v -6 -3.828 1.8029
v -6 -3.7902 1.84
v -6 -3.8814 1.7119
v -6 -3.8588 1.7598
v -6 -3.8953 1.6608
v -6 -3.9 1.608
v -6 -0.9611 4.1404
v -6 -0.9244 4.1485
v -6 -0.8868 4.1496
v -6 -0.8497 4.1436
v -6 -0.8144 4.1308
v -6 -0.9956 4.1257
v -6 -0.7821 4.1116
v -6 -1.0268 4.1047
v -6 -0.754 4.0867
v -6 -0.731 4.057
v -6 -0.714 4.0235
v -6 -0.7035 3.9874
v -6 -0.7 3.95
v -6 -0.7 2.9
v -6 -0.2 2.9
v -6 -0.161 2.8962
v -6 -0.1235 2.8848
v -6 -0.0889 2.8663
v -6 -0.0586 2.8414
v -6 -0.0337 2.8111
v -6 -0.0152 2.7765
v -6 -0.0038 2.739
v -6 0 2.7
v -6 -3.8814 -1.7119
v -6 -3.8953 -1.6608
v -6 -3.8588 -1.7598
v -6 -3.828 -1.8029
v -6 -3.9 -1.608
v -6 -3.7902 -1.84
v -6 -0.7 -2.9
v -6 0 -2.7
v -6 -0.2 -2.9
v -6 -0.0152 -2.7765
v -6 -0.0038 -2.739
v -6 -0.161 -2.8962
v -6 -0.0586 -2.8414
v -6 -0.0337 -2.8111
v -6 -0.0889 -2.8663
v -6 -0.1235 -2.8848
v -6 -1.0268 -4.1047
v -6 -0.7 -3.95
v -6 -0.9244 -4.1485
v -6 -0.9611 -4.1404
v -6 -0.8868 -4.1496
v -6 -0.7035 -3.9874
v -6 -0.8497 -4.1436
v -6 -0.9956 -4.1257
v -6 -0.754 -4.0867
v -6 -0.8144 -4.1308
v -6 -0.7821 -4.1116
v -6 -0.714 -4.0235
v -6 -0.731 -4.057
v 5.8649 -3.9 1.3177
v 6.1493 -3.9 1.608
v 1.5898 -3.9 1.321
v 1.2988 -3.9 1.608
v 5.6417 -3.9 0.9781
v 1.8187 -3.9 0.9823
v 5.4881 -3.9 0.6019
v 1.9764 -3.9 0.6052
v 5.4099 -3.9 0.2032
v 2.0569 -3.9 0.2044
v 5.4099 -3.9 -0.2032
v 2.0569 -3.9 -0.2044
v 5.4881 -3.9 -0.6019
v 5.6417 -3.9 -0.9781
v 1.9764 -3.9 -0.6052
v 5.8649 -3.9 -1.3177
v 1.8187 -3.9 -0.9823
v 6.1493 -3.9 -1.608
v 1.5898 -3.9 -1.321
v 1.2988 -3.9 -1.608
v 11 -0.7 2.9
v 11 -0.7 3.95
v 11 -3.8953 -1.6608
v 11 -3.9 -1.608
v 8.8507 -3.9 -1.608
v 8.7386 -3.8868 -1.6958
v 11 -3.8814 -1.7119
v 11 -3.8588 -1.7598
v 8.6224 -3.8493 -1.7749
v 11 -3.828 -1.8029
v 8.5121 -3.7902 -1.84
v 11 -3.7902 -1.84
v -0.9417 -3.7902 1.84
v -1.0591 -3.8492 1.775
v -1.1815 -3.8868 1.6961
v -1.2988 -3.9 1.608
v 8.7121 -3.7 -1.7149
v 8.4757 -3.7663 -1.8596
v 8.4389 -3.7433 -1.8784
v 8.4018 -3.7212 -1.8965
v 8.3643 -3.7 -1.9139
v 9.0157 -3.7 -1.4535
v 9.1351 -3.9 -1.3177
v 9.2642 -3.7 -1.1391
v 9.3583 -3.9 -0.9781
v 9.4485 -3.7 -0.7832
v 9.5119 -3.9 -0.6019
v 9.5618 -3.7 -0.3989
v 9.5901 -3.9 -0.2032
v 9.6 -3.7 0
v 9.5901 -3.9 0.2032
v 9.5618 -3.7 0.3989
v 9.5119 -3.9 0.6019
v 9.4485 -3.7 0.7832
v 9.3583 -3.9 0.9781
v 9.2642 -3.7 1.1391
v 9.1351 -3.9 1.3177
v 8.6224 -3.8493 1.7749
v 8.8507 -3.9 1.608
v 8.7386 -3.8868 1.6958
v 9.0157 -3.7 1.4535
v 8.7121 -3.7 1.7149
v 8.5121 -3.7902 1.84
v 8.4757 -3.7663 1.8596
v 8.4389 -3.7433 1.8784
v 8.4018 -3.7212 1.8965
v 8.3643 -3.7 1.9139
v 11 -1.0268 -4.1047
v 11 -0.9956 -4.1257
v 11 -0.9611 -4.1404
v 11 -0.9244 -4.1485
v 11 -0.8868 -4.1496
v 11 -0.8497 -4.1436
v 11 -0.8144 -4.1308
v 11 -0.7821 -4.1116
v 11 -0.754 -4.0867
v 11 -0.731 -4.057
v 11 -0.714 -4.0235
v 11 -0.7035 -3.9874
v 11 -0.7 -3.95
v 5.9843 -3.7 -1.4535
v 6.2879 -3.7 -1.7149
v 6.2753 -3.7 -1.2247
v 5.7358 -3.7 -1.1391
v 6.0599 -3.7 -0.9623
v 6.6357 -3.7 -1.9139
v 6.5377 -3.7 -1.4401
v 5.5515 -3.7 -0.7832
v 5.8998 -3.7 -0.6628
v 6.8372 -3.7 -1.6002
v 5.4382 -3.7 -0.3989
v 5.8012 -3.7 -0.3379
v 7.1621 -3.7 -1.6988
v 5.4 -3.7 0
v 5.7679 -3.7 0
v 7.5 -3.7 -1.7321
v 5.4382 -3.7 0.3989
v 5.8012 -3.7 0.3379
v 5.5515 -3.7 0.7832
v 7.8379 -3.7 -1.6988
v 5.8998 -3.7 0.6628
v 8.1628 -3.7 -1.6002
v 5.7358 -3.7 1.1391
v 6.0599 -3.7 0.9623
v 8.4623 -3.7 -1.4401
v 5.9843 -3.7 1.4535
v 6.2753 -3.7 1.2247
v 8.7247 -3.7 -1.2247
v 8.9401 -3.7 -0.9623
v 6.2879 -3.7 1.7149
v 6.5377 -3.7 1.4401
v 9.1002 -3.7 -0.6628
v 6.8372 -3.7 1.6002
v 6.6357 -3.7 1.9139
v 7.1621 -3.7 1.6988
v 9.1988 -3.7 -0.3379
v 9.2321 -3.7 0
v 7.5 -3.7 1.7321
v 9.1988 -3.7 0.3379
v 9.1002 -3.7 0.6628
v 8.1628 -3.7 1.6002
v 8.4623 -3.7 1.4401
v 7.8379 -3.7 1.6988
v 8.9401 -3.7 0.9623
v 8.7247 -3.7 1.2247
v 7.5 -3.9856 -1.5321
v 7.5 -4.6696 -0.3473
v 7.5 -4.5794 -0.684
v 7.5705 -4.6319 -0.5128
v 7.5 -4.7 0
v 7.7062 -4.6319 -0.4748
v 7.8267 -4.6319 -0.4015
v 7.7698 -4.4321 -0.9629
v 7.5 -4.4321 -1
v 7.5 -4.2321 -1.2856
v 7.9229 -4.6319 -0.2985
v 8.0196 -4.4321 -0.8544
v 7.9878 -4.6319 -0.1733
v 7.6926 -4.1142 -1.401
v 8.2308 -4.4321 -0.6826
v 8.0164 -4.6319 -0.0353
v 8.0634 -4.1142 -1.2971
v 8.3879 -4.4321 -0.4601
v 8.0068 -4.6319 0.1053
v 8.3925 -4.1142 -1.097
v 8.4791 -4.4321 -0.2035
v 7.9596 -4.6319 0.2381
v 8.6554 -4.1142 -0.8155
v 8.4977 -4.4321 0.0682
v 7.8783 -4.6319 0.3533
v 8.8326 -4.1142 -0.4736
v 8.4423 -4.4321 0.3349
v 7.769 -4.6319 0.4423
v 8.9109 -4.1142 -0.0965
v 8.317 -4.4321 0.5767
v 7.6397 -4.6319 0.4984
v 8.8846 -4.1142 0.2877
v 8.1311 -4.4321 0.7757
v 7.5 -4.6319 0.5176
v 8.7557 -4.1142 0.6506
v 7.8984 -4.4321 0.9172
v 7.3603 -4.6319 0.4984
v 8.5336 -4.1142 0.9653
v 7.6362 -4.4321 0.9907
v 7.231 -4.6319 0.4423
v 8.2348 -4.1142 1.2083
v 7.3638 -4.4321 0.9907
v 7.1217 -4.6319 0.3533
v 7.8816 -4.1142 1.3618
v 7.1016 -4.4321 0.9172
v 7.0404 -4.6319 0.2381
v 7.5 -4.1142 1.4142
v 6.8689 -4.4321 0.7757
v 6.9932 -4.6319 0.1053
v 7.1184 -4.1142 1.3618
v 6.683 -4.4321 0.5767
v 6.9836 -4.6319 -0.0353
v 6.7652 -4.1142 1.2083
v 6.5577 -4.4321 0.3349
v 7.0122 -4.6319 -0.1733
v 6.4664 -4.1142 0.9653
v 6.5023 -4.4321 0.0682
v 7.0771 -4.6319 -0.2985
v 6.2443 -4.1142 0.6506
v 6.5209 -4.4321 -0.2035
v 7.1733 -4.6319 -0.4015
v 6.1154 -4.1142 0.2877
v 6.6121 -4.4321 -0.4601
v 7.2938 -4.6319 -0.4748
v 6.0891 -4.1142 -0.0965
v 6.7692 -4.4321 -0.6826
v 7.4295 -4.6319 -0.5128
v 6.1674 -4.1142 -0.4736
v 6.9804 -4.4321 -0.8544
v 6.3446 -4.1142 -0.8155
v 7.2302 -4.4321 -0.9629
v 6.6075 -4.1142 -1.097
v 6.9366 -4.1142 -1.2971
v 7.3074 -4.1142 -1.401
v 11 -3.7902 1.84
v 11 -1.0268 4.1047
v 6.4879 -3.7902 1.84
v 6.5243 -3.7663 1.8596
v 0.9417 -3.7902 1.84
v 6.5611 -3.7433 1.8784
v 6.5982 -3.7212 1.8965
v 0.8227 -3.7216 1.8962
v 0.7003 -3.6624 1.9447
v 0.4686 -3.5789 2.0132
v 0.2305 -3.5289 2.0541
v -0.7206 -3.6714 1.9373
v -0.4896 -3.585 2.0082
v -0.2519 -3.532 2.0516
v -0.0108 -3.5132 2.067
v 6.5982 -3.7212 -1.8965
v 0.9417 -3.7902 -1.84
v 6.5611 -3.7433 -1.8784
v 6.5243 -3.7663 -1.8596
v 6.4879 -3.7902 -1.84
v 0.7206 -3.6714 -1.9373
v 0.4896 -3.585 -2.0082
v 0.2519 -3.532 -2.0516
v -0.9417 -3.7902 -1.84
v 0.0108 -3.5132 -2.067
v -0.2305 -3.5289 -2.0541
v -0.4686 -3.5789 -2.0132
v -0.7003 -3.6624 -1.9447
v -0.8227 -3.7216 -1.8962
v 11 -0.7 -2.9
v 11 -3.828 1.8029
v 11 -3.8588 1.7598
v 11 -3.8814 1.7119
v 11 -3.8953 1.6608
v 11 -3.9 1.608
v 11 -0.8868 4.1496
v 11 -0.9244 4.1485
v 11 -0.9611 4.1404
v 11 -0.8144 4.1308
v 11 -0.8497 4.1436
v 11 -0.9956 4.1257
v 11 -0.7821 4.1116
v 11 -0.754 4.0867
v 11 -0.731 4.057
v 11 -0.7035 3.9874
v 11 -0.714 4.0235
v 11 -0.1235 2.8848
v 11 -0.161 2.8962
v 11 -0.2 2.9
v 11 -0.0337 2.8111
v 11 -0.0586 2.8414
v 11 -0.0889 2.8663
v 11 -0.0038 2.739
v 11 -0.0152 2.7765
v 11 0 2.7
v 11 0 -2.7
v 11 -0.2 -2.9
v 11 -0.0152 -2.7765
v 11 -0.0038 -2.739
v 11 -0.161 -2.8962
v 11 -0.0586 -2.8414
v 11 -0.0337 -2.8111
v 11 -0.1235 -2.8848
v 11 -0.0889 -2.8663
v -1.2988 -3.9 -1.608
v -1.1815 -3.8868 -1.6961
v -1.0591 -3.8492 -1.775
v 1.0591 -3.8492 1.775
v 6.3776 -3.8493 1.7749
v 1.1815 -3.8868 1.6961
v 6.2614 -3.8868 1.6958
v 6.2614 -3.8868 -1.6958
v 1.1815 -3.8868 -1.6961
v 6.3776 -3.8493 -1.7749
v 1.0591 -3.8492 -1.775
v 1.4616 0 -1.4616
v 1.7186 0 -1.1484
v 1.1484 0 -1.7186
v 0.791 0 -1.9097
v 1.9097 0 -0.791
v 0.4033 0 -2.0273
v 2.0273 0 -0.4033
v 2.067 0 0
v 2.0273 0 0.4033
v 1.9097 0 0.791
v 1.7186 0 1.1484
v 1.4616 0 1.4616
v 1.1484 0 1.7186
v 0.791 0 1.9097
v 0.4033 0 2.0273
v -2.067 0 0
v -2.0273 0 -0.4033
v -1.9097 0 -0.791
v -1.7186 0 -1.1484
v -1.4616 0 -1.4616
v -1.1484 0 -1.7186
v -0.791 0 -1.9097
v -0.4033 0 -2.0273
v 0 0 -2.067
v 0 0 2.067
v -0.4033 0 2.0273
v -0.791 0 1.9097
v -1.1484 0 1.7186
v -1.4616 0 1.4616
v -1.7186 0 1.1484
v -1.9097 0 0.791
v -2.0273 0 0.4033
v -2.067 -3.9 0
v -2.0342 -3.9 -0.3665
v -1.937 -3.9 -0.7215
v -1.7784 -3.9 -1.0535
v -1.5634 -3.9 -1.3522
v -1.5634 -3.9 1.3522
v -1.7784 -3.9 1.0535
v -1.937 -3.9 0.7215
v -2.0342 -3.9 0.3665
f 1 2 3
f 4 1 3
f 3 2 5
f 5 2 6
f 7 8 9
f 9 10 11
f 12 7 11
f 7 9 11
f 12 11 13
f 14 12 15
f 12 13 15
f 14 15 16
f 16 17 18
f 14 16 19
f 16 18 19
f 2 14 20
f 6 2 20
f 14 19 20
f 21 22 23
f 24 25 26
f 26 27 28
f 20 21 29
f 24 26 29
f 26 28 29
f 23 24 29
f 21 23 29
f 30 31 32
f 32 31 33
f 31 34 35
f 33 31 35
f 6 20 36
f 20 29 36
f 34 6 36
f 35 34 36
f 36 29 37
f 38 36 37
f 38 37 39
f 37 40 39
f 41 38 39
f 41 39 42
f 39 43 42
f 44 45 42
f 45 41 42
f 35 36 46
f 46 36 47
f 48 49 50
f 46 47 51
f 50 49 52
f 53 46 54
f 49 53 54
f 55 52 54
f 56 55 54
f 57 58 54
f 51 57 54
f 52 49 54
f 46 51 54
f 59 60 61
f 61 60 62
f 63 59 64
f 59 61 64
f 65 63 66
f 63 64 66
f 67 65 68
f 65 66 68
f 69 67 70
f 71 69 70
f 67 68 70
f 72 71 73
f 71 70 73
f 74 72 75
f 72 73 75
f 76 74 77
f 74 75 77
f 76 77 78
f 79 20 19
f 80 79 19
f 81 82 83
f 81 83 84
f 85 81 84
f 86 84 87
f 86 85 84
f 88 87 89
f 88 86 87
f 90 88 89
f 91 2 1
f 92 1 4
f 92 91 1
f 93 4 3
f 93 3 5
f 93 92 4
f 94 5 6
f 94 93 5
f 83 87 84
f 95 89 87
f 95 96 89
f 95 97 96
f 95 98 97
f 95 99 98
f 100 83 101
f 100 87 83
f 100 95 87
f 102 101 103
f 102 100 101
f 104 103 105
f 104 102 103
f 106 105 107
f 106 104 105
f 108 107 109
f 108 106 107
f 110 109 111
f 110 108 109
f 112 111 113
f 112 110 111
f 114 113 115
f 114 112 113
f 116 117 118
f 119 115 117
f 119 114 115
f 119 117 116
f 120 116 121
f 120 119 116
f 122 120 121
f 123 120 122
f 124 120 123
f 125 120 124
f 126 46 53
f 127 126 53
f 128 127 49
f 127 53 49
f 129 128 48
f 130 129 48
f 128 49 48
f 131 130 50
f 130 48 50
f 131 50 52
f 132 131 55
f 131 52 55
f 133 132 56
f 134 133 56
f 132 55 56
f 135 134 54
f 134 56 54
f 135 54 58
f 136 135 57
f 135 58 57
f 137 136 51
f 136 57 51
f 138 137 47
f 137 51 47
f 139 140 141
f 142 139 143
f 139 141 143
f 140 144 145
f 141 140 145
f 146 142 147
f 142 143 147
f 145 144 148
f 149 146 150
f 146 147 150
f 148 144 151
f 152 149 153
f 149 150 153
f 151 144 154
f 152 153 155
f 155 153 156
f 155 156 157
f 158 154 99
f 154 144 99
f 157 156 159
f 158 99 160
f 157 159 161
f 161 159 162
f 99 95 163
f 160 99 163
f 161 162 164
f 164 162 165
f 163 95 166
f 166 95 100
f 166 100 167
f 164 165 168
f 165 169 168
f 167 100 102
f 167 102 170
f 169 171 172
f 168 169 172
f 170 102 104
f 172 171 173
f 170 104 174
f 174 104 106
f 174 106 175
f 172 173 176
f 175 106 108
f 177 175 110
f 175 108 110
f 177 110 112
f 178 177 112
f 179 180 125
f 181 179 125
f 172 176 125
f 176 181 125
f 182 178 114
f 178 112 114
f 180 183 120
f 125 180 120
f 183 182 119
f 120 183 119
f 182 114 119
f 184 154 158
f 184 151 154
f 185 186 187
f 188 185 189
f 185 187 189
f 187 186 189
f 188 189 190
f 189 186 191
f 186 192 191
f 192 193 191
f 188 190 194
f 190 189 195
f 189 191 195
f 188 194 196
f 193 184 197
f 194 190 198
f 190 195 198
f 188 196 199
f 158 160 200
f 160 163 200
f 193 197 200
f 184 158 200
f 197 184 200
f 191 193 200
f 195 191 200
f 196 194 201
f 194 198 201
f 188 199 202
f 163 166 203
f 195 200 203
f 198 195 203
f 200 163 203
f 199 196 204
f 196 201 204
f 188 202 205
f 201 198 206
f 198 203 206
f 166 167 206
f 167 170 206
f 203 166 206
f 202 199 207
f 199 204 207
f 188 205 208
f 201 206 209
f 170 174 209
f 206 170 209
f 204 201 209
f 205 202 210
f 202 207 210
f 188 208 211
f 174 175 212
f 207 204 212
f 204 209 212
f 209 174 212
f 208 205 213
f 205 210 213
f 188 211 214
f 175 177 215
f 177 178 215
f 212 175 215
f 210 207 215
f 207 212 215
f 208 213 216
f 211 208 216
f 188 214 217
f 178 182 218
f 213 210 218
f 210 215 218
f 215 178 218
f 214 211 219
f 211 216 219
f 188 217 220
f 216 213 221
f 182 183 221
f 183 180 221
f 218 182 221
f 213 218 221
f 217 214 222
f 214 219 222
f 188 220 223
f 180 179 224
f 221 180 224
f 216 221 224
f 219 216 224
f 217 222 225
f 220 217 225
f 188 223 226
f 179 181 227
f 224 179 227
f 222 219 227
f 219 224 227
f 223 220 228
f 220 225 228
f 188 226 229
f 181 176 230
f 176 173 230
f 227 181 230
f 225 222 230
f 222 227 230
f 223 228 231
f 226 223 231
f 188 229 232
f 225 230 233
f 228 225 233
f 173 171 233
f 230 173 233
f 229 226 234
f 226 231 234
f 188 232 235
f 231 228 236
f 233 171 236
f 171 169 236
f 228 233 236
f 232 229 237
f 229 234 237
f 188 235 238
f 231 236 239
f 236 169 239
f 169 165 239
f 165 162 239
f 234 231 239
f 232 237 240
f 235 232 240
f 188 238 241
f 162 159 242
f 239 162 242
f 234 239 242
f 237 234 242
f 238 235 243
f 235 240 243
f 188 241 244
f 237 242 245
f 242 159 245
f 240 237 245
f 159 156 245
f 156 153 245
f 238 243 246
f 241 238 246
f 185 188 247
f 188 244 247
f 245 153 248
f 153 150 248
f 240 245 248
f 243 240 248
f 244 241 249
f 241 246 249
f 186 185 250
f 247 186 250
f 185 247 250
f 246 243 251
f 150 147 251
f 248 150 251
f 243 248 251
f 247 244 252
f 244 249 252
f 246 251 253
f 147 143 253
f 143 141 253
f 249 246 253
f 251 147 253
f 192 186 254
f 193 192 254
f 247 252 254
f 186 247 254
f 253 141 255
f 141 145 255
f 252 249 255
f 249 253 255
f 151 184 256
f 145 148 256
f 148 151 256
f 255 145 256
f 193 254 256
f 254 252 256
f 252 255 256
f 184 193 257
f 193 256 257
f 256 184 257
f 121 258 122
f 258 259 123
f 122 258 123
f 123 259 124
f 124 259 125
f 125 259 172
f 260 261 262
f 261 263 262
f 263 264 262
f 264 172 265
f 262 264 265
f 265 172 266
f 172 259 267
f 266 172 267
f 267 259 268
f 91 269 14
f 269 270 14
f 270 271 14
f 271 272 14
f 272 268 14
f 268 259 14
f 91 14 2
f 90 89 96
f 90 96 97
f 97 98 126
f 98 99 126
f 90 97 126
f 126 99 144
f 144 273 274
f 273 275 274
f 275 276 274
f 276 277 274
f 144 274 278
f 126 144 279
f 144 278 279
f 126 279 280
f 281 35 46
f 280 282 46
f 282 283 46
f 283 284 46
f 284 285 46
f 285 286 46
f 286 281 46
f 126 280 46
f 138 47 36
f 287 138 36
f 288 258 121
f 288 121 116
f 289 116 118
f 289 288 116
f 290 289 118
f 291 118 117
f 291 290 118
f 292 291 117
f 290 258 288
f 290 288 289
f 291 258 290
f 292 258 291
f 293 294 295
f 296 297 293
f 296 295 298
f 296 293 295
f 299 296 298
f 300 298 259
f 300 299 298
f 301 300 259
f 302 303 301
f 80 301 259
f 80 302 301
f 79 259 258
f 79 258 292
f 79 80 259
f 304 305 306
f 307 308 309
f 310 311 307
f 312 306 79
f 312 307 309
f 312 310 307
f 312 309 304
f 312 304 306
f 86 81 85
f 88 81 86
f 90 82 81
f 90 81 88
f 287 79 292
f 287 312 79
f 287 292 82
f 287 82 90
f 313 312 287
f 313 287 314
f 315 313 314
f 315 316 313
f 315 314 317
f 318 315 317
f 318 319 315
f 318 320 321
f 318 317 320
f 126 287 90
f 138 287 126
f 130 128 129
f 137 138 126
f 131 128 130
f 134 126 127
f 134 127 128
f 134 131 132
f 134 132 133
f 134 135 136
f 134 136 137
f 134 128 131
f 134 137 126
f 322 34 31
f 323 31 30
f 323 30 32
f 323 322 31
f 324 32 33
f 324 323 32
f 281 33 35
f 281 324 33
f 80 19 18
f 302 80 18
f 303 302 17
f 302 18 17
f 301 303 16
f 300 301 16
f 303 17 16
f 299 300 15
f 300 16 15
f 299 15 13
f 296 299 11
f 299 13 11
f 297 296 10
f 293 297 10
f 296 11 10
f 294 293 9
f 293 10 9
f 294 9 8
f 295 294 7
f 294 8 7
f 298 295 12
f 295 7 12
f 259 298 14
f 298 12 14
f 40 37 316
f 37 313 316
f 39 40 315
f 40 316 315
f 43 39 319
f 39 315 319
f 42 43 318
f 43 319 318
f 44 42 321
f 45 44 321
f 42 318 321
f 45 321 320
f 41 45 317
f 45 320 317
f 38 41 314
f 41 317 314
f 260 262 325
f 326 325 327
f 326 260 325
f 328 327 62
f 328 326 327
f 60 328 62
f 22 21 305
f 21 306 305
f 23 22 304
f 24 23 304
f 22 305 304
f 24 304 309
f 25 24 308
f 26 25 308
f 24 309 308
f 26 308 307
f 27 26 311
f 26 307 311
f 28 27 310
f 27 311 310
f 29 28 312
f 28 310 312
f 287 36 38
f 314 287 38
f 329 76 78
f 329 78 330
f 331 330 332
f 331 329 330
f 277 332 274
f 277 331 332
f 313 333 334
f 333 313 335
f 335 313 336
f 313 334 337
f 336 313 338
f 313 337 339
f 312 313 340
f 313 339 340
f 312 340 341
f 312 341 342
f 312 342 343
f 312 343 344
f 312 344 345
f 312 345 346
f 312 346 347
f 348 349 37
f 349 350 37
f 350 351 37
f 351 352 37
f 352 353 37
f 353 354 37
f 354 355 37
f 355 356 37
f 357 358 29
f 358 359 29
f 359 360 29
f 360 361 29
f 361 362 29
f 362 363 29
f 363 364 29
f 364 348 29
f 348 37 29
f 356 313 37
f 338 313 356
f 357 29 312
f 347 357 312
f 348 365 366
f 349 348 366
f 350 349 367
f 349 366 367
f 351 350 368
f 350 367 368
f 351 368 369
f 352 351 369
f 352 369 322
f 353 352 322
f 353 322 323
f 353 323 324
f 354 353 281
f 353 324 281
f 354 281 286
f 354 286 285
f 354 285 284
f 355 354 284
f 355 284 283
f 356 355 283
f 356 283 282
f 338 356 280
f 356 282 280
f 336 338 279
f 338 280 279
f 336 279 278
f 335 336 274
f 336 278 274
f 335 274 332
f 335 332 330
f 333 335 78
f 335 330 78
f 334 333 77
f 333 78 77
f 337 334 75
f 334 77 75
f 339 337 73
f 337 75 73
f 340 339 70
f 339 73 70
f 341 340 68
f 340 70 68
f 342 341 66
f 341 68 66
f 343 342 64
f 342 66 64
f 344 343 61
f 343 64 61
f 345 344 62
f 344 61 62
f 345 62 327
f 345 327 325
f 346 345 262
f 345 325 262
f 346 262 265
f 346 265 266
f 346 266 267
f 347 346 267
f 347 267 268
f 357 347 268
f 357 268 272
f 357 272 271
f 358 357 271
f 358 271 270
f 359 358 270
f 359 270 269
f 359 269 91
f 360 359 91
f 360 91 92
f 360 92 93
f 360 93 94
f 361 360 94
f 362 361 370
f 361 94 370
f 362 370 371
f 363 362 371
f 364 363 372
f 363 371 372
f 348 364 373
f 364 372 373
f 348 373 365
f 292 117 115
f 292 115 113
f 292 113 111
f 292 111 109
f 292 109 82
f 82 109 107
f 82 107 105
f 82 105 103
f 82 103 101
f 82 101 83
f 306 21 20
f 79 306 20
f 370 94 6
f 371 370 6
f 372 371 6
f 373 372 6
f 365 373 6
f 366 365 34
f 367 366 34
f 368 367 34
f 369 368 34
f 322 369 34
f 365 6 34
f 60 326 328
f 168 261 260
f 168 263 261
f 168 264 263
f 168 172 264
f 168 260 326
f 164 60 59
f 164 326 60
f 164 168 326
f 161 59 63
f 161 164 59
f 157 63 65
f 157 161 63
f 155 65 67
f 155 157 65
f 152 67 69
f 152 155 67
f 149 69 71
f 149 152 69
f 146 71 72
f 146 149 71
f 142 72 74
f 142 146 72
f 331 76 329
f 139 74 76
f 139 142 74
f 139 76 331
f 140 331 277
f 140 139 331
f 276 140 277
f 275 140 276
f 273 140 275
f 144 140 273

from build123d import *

# Parameters (mm, degrees)
BOSS_EXTRUDE1_DEPTH = 17
FILLET1_R           = 0.3
FILLET2_R           = 0.2
SKETCH2_W           = 2.1
SKETCH2_H           = 0.2
TAPPED_HOLE1_D      = 4.134


with BuildPart() as part:
    # Sketch1 → Boss-Extrude1 (new body)
    with BuildSketch(Plane(origin=(-6, 0, 0), x_dir=(0, 0, -1), z_dir=(1, 0, 0))):
        with BuildLine():
            Line((2.9, 0), (-2.9, 0))
            Line((-2.9, 0), (-2.9, -0.7))
            Line((-2.9, -0.7), (-3.95, -0.7))
            ThreePointArc((-3.95, -0.7), (-4.13076842, -0.814426765), (-4.104689384, -1.026772215))
            Line((-4.104689384, -1.026772215), (-1.75, -3.9))
            Line((-1.75, -3.9), (1.75, -3.9))
            Line((1.75, -3.9), (4.104689384, -1.026772215))
            ThreePointArc((4.104689384, -1.026772215), (4.13076842, -0.814426765), (3.95, -0.7))
            Line((3.95, -0.7), (2.9, -0.7))
            Line((2.9, -0.7), (2.9, 0))
        make_face()
    extrude(amount=BOSS_EXTRUDE1_DEPTH)

    # Fillet1
    fillet1_edges = [part.edges().sort_by_distance(p)[0] for p in [
        (2.5, -3.9, -1.75),
        (2.5, -3.9, 1.75),
    ]]
    fillet(fillet1_edges, radius=FILLET1_R)

    # Fillet2
    fillet2_edges = [part.edges().sort_by_distance(p)[0] for p in [
        (2.5, 0, 2.9),
        (2.5, 0, -2.9),
    ]]
    fillet(fillet2_edges, radius=FILLET2_R)

    # Sketch2 → Cut-Revolve1 (revolve, cut)
    with BuildSketch(Plane(origin=(7.5, 0, 0), x_dir=(0, 0, -1), z_dir=(1, 0, 0))):
        with Locations((1.05, -3.8)):
            Rectangle(SKETCH2_W, SKETCH2_H)
    revolve(axis=Axis((7.5, 1.665548573, 0), (0, -1, 0)), mode=Mode.SUBTRACT)

    # Sketch3 → Revolve1 (revolve)
    with BuildSketch(Plane(origin=(7.5, 0, 0), x_dir=(0, 0, -1), z_dir=(1, 0, 0))):
        with BuildLine():
            Line((1.732050808, -3.7), (0, -3.7))
            Line((0, -3.7), (0, -4.7))
            ThreePointArc((0, -4.7), (1, -4.432050808), (1.732050808, -3.7))
        make_face()
    revolve(axis=Axis((7.5, 0, 0), (0, -1, 0)))

    # Tapped Hole1 (through all)
    with Locations(Plane(origin=(0, 0, 0), x_dir=(1, 0, 0), z_dir=(0, 1, 0))):
        with Locations((0, 0)):
            Hole(TAPPED_HOLE1_D / 2)


solid = part.part
